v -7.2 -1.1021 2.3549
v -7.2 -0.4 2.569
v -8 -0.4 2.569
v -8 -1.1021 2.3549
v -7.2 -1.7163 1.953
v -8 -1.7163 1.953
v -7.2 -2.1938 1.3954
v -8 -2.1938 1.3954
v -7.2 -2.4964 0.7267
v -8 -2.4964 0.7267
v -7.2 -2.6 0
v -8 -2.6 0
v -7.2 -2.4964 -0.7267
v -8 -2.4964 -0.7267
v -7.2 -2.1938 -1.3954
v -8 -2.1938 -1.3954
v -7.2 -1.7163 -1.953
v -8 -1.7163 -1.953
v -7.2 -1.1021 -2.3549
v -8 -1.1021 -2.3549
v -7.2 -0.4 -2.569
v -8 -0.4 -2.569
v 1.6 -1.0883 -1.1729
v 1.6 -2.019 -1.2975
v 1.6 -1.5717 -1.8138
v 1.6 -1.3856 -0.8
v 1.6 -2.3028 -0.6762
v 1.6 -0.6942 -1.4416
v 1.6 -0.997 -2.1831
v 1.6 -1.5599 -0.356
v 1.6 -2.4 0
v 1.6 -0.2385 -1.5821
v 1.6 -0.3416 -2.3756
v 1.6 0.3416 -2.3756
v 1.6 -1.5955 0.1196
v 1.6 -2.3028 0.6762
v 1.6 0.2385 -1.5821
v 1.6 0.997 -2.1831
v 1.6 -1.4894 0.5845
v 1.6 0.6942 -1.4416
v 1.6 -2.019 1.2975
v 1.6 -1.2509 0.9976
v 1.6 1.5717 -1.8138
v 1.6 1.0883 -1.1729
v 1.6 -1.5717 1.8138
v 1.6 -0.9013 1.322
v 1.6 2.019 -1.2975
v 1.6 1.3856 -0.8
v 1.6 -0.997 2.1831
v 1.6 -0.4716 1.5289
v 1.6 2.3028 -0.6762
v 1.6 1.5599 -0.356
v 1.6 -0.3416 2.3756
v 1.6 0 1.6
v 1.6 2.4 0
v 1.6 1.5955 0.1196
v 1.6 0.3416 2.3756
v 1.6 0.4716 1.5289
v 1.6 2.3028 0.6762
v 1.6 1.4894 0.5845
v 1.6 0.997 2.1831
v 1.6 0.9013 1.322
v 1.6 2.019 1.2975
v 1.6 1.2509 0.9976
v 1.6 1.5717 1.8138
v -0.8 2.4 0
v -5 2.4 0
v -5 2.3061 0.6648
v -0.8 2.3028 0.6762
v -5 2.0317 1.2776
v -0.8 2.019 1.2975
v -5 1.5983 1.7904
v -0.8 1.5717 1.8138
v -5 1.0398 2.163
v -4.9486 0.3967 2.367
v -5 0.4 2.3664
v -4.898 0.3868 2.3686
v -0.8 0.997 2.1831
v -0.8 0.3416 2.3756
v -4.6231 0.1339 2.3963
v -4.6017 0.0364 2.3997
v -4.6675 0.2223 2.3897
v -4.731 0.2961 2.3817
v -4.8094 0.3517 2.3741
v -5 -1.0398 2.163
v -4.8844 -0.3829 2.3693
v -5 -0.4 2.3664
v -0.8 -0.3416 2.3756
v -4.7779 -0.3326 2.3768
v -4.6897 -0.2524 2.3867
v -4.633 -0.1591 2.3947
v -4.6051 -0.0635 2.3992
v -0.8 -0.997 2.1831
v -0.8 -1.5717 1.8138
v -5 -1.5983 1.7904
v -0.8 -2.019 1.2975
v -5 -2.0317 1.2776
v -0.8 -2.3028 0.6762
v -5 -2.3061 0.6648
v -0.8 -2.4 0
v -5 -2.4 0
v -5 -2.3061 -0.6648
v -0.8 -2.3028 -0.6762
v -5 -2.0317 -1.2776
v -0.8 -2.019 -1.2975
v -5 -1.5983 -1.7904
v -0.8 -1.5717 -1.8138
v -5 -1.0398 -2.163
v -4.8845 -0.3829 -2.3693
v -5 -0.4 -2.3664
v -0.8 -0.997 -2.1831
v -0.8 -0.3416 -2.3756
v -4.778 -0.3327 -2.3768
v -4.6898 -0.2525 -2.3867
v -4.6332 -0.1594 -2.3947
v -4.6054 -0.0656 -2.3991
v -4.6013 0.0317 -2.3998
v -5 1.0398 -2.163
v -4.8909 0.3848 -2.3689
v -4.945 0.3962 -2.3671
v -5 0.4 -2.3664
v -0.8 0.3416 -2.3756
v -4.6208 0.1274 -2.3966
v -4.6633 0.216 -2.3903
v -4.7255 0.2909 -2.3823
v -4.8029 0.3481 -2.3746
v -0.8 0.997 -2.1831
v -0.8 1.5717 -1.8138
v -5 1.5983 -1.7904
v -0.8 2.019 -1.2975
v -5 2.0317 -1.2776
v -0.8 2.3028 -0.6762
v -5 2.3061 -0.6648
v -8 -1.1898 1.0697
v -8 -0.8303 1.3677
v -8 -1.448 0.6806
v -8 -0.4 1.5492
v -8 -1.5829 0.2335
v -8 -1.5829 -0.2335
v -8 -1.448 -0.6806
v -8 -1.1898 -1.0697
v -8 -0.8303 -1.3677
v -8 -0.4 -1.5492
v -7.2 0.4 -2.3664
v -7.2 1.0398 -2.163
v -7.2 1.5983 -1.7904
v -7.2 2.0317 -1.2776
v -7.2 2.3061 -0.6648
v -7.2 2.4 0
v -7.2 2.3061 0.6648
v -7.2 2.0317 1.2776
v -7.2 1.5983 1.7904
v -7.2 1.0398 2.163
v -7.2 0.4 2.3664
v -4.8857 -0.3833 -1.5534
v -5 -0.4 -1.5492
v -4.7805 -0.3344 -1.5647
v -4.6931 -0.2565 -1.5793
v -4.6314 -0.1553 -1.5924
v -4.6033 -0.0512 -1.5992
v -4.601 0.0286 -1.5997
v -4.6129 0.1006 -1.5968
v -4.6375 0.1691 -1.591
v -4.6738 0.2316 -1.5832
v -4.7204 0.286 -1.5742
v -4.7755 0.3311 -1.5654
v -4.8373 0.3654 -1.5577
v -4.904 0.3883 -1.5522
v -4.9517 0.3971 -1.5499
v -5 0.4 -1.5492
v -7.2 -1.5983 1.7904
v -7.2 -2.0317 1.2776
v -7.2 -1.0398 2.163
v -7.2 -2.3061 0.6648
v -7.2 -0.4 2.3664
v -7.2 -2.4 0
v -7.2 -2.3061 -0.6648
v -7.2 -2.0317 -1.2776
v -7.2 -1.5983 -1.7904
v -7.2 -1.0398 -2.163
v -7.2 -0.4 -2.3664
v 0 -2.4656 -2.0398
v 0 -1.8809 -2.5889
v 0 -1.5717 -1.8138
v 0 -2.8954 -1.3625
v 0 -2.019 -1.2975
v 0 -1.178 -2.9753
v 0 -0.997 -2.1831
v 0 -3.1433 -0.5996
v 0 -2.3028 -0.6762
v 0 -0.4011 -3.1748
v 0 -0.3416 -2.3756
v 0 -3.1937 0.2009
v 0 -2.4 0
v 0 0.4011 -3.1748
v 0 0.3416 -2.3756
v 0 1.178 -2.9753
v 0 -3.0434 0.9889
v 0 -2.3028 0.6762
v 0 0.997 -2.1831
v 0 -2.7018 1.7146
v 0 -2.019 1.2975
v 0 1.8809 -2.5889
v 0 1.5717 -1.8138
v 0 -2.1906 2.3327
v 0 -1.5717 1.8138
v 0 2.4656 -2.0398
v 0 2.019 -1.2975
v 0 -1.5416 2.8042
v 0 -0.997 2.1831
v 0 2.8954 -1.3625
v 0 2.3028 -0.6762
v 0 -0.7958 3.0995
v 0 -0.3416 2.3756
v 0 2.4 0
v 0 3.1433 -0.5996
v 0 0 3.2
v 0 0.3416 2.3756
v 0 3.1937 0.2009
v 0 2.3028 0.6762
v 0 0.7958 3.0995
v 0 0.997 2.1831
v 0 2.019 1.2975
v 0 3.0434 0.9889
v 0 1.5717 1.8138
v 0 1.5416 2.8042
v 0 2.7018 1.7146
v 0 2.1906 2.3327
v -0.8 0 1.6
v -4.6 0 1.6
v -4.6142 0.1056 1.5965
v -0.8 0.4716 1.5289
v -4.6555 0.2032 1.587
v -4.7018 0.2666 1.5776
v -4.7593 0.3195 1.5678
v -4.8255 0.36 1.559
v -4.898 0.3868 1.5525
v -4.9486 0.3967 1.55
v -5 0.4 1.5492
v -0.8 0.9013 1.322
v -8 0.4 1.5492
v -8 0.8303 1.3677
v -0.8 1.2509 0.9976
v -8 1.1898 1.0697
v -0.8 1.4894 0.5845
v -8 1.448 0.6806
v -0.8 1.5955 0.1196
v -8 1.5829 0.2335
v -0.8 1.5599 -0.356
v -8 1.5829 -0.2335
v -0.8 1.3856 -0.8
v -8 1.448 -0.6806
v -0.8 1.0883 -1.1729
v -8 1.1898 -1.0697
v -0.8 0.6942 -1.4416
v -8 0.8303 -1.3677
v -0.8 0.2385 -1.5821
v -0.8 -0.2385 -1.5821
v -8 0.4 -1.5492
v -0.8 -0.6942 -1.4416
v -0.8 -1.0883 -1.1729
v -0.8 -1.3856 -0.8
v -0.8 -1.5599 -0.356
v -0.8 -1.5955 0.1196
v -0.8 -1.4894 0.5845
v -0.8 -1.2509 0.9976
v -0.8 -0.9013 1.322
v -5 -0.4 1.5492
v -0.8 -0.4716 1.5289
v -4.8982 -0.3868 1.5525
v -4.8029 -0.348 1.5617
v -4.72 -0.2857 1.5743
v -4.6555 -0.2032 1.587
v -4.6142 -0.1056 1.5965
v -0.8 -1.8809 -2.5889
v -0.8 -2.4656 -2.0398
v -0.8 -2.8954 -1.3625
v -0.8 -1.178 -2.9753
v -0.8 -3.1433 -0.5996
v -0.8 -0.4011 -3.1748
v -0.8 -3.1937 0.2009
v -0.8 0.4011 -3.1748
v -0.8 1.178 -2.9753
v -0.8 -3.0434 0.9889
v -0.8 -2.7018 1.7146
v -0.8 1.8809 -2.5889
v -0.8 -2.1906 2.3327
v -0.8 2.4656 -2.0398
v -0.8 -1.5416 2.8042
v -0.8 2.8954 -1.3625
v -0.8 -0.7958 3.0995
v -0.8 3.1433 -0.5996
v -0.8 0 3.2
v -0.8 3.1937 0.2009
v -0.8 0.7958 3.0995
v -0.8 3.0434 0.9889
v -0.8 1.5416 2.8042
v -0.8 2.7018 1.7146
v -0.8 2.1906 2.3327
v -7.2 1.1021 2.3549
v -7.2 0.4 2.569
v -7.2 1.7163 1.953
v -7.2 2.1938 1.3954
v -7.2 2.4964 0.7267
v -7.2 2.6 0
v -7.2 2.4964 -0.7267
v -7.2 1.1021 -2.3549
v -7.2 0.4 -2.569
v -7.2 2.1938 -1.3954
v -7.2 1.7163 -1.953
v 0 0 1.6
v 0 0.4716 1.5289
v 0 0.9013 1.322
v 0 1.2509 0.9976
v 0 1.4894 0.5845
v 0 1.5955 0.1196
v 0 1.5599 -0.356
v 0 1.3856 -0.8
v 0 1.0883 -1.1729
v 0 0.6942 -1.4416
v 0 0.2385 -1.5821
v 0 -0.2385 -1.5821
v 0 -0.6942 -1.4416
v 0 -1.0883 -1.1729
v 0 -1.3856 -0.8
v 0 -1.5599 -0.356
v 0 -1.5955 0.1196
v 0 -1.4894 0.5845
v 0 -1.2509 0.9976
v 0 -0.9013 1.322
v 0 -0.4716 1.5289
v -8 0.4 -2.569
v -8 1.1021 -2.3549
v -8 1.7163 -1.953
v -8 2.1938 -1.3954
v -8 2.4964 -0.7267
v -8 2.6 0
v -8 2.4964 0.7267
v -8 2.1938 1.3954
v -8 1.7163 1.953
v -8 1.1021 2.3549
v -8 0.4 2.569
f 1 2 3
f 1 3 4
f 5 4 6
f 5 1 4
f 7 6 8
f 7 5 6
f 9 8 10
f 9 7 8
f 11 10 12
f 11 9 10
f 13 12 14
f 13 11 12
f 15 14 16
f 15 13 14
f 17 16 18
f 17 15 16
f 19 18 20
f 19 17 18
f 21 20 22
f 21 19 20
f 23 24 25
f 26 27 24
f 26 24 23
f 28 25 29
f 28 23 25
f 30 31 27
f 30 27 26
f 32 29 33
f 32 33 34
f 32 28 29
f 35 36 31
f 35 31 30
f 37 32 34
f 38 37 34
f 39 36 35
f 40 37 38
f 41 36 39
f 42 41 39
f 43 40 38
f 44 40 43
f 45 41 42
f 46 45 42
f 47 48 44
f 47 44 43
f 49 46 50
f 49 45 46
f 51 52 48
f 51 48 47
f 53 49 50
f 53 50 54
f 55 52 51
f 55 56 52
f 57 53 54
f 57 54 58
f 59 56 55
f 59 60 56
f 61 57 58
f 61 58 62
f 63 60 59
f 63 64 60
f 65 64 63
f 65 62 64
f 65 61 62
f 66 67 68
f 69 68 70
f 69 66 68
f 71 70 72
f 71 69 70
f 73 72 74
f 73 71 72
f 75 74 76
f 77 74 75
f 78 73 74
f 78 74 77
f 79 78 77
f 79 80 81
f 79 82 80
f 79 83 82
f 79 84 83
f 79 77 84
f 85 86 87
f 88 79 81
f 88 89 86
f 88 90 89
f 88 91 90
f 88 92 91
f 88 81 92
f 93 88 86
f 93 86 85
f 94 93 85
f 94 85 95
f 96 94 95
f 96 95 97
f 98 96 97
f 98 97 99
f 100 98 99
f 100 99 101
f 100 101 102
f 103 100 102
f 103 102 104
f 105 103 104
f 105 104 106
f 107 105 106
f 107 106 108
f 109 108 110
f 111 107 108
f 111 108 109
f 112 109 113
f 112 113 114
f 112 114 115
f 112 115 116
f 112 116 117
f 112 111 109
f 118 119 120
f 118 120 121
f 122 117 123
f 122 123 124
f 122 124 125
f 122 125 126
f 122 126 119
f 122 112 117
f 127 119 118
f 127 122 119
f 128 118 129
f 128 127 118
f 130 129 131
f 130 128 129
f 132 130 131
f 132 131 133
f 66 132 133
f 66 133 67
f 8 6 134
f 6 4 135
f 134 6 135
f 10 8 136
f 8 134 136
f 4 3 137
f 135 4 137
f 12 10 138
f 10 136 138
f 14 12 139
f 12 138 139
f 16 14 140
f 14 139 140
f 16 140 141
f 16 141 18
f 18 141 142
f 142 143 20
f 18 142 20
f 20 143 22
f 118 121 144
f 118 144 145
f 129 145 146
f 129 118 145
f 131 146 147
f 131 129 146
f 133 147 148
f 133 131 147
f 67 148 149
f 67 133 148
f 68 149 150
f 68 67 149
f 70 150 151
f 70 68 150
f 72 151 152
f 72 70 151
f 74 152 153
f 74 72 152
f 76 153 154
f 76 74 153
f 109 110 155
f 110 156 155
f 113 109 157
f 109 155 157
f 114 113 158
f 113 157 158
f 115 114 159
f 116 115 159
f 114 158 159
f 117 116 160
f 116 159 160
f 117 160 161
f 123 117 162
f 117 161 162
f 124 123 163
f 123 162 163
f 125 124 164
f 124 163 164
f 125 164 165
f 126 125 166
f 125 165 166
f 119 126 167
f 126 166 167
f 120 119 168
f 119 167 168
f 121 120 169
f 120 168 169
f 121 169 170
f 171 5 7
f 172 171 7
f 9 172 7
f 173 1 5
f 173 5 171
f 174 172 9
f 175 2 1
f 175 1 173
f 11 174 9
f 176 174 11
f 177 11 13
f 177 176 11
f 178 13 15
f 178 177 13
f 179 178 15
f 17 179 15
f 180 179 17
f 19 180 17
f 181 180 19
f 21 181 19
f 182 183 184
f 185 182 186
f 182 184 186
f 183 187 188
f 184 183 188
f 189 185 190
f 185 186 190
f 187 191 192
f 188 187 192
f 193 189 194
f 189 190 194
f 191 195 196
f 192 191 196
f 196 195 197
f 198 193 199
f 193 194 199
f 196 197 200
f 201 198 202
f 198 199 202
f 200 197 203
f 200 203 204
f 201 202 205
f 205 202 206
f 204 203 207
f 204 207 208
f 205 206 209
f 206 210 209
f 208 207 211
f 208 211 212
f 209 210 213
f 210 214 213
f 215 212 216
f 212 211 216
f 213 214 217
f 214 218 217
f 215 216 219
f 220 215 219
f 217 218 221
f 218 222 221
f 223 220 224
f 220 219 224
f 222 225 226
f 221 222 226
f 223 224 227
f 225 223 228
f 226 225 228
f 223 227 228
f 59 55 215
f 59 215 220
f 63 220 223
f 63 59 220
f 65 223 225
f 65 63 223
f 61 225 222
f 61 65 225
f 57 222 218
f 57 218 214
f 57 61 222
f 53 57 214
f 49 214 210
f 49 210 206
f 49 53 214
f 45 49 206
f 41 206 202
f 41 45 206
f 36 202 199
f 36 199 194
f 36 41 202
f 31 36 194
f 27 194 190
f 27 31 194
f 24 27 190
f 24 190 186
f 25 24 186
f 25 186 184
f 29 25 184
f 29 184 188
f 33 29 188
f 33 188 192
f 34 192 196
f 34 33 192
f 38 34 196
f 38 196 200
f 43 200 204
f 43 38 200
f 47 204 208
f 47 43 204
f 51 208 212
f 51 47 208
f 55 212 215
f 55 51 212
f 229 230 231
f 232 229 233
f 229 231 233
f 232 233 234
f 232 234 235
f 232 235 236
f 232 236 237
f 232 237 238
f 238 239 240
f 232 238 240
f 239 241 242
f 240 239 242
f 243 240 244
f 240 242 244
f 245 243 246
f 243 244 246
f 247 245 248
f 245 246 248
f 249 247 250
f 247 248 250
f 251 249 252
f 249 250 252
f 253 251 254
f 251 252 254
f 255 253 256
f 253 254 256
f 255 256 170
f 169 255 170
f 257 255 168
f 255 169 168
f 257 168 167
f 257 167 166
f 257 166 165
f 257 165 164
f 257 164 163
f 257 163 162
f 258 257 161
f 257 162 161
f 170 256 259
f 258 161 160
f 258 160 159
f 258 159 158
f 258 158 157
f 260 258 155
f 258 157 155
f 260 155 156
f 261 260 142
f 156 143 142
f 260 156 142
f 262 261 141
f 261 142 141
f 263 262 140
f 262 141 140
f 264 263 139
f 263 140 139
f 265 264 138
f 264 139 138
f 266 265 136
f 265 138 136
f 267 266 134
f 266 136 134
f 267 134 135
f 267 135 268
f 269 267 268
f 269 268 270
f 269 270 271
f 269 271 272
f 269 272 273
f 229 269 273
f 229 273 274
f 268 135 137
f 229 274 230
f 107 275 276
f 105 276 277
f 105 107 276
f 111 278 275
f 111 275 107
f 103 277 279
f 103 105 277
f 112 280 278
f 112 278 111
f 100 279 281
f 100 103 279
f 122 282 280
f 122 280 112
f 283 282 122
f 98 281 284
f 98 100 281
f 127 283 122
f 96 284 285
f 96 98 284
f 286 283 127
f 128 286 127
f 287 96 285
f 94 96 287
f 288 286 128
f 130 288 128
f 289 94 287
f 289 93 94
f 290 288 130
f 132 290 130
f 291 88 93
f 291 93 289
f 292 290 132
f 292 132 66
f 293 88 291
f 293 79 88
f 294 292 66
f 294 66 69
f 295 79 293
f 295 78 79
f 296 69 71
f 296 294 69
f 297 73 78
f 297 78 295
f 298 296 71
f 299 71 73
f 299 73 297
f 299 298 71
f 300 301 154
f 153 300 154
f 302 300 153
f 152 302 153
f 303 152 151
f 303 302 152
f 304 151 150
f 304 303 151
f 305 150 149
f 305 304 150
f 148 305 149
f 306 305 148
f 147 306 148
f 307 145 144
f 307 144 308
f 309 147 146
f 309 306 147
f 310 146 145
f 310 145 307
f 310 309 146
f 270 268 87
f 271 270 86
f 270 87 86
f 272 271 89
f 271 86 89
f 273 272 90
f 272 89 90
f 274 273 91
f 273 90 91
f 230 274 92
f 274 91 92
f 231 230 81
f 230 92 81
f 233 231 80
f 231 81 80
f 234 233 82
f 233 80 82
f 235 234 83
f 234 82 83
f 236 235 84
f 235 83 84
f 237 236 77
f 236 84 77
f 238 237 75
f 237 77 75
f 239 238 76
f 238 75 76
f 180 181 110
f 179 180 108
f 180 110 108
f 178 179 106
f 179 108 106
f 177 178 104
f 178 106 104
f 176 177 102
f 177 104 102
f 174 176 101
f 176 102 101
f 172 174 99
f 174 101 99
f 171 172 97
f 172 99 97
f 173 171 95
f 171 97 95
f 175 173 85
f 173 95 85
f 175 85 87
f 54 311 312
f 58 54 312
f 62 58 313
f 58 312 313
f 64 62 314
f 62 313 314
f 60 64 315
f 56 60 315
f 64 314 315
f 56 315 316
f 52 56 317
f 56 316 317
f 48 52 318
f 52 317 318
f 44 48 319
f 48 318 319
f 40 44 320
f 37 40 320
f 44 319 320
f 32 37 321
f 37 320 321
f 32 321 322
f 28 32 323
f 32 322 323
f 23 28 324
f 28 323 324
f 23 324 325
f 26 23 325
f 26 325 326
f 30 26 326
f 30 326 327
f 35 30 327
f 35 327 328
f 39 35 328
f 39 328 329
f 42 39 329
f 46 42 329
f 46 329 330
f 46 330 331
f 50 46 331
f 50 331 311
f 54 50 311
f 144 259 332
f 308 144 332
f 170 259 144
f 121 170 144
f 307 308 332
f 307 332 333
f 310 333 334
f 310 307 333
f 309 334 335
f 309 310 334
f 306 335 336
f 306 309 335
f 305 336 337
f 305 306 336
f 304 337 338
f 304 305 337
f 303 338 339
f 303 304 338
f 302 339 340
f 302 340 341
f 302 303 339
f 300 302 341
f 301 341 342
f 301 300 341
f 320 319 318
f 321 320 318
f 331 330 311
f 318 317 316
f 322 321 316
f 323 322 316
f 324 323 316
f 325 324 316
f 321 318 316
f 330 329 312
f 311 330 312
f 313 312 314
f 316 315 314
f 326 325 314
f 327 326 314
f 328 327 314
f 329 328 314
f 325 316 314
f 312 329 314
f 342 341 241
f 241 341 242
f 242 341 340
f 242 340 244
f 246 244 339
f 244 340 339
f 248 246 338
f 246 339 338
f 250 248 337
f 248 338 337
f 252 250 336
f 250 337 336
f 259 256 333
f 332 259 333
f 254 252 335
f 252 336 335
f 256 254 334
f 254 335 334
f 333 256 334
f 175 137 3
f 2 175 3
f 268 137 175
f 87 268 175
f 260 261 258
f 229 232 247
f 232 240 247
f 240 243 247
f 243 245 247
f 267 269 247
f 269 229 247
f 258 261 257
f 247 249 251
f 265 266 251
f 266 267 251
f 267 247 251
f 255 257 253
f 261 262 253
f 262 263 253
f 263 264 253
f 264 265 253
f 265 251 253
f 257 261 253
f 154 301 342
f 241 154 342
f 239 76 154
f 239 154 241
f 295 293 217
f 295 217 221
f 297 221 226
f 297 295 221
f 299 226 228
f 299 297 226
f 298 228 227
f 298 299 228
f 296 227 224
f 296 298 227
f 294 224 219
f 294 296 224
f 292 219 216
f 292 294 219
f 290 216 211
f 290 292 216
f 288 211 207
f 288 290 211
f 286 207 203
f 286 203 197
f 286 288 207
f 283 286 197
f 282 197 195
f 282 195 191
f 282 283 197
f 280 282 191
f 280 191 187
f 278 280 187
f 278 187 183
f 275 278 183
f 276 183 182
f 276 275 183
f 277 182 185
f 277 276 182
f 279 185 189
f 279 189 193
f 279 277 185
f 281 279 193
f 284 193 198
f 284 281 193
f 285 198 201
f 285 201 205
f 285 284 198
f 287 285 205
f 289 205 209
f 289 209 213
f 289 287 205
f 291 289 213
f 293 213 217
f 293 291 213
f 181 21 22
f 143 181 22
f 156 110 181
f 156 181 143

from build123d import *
from build123d.topology import SkipClean

# Parameters (mm, degrees)
SKETCH1_W                      = 4.2
SKETCH1_H                      = 2.4
F_0_8_0_8_DIAMETER_HOLE1_D     = 0.8
SKETCH6_R                      = 3.2
BOSS_EXTRUDE1_DEPTH            = 0.8
BOSS_EXTRUDE2_DEPTH            = 3
CUT_EXTRUDE1_DEPTH             = 2.2
BOSS_EXTRUDE3_DEPTH            = 2.2
BOSS_EXTRUDE4_DEPTH            = 0.8
BOSS_EXTRUDE5_START            = 1.6
SKETCH11_R                     = 2.4
BOSS_EXTRUDE5_DEPTH            = 1.6
SKETCH16_W                     = 7.2
SKETCH16_H                     = 1.6
F_3_2_3_2_DIAMETER_HOLE1_D     = 3.2
F_3_2_3_2_DIAMETER_HOLE1_DEPTH = 1.6


with BuildPart() as part:
    # Sketch1 → Revolve1 (revolve)
    with BuildSketch(Plane.XY):
        with Locations((-2.9, 1.2)):
            Rectangle(SKETCH1_W, SKETCH1_H)
    revolve(axis=Axis((-5, 0, 0), (1, 0, 0)))

    # Ø0.8 (0.8) Diameter Hole1 (through all)
    with Locations(Plane(origin=(-5, 0, -2.4), x_dir=(0, -1, 0), z_dir=(0, 0, -1))):
        with Locations((0, 0)):
            Hole(F_0_8_0_8_DIAMETER_HOLE1_D / 2)

    # Sketch6 → Boss-Extrude1 (add)
    with BuildSketch(Plane.ZY.offset(0.8)):
        Circle(SKETCH6_R)
    extrude(amount=-BOSS_EXTRUDE1_DEPTH)

    # Sketch7 → Boss-Extrude2 (add)
    with BuildSketch(Plane.ZY.offset(5)):
        with BuildLine():
            Line((-2.569046516, -0.4), (2.569046516, -0.4))
            ThreePointArc((2.569046516, -0.4), (0, -2.6), (-2.569046516, -0.4))
        make_face()
    extrude(amount=BOSS_EXTRUDE2_DEPTH)

    # Sketch8 → Cut-Extrude1 (cut)
    with SkipClean():  # the faces are left unmerged after this step: merging them gives an invalid solid
        with BuildSketch(Plane(origin=(-5, 0, 0), x_dir=(0, 0, -1), z_dir=(1, 0, 0))):
            with BuildLine():
                Line((2.569046516, -0.4), (2.366431913, -0.4))
                ThreePointArc((2.366431913, -0.4), (0, -2.4), (-2.366431913, -0.4))
                Line((-2.366431913, -0.4), (-2.569046516, -0.4))
                ThreePointArc((-2.569046516, -0.4), (0, -2.6), (2.569046516, -0.4))
            make_face()
        extrude(amount=-CUT_EXTRUDE1_DEPTH, mode=Mode.SUBTRACT)

    # Sketch9 → Boss-Extrude3 (add)
    with SkipClean():  # the faces are left unmerged after this step: merging them gives an invalid solid
        with BuildSketch(Plane.ZY.offset(5)):
            with BuildLine():
                Line((2.366431913, 0.4), (-2.366431913, 0.4))
                ThreePointArc((-2.366431913, 0.4), (0, 2.4), (2.366431913, 0.4))
            make_face()
        extrude(amount=BOSS_EXTRUDE3_DEPTH)

    # Sketch10 → Boss-Extrude4 (add)
    with SkipClean():  # the faces are left unmerged after this step: merging them gives an invalid solid
        with BuildSketch(Plane.ZY.offset(7.2)):
            with BuildLine():
                Line((2.569046516, 0.4), (-2.569046516, 0.4))
                ThreePointArc((-2.569046516, 0.4), (0, 2.6), (2.569046516, 0.4))
            make_face()
        extrude(amount=BOSS_EXTRUDE4_DEPTH)

    # Sketch11 → Boss-Extrude5 (add)
    with SkipClean():  # the faces are left unmerged after this step: merging them gives an invalid solid
        with BuildSketch(Plane(origin=(0, 0, 0), x_dir=(0, 0, -1), z_dir=(1, 0, 0)).offset(BOSS_EXTRUDE5_START)):
            with Locations(Location((0, 0, 0), (0, 0, 90))):
                Circle(SKETCH11_R)
        extrude(amount=-BOSS_EXTRUDE5_DEPTH)

    # Sketch16 → Cut-Revolve1 (revolve, cut)
    with SkipClean():  # the faces are left unmerged after this step: merging them gives an invalid solid
        with BuildSketch(Plane(origin=(0, 0, 0), x_dir=(-1, 0, 0), z_dir=(0, 0, -1)), mode=Mode.PRIVATE) as cut_revolve1_sk:
            with Locations((4.4, 0.8)):
                Rectangle(SKETCH16_W, SKETCH16_H)
        revolve(cut_revolve1_sk.sketch.rotate(Axis((-0.8, 0, 0), (-1, 0, 0)), 270), axis=Axis((-0.8, 0, 0), (-1, 0, 0)), mode=Mode.SUBTRACT)

    # Ø3.2 (3.2) Diameter Hole1
    with Locations(Plane(origin=(1.6, 0, 0), x_dir=(0, 0, -1), z_dir=(1, 0, 0))):
        with Locations((0, 0)):
            Hole(F_3_2_3_2_DIAMETER_HOLE1_D / 2, depth=F_3_2_3_2_DIAMETER_HOLE1_DEPTH)


solid = part.part
